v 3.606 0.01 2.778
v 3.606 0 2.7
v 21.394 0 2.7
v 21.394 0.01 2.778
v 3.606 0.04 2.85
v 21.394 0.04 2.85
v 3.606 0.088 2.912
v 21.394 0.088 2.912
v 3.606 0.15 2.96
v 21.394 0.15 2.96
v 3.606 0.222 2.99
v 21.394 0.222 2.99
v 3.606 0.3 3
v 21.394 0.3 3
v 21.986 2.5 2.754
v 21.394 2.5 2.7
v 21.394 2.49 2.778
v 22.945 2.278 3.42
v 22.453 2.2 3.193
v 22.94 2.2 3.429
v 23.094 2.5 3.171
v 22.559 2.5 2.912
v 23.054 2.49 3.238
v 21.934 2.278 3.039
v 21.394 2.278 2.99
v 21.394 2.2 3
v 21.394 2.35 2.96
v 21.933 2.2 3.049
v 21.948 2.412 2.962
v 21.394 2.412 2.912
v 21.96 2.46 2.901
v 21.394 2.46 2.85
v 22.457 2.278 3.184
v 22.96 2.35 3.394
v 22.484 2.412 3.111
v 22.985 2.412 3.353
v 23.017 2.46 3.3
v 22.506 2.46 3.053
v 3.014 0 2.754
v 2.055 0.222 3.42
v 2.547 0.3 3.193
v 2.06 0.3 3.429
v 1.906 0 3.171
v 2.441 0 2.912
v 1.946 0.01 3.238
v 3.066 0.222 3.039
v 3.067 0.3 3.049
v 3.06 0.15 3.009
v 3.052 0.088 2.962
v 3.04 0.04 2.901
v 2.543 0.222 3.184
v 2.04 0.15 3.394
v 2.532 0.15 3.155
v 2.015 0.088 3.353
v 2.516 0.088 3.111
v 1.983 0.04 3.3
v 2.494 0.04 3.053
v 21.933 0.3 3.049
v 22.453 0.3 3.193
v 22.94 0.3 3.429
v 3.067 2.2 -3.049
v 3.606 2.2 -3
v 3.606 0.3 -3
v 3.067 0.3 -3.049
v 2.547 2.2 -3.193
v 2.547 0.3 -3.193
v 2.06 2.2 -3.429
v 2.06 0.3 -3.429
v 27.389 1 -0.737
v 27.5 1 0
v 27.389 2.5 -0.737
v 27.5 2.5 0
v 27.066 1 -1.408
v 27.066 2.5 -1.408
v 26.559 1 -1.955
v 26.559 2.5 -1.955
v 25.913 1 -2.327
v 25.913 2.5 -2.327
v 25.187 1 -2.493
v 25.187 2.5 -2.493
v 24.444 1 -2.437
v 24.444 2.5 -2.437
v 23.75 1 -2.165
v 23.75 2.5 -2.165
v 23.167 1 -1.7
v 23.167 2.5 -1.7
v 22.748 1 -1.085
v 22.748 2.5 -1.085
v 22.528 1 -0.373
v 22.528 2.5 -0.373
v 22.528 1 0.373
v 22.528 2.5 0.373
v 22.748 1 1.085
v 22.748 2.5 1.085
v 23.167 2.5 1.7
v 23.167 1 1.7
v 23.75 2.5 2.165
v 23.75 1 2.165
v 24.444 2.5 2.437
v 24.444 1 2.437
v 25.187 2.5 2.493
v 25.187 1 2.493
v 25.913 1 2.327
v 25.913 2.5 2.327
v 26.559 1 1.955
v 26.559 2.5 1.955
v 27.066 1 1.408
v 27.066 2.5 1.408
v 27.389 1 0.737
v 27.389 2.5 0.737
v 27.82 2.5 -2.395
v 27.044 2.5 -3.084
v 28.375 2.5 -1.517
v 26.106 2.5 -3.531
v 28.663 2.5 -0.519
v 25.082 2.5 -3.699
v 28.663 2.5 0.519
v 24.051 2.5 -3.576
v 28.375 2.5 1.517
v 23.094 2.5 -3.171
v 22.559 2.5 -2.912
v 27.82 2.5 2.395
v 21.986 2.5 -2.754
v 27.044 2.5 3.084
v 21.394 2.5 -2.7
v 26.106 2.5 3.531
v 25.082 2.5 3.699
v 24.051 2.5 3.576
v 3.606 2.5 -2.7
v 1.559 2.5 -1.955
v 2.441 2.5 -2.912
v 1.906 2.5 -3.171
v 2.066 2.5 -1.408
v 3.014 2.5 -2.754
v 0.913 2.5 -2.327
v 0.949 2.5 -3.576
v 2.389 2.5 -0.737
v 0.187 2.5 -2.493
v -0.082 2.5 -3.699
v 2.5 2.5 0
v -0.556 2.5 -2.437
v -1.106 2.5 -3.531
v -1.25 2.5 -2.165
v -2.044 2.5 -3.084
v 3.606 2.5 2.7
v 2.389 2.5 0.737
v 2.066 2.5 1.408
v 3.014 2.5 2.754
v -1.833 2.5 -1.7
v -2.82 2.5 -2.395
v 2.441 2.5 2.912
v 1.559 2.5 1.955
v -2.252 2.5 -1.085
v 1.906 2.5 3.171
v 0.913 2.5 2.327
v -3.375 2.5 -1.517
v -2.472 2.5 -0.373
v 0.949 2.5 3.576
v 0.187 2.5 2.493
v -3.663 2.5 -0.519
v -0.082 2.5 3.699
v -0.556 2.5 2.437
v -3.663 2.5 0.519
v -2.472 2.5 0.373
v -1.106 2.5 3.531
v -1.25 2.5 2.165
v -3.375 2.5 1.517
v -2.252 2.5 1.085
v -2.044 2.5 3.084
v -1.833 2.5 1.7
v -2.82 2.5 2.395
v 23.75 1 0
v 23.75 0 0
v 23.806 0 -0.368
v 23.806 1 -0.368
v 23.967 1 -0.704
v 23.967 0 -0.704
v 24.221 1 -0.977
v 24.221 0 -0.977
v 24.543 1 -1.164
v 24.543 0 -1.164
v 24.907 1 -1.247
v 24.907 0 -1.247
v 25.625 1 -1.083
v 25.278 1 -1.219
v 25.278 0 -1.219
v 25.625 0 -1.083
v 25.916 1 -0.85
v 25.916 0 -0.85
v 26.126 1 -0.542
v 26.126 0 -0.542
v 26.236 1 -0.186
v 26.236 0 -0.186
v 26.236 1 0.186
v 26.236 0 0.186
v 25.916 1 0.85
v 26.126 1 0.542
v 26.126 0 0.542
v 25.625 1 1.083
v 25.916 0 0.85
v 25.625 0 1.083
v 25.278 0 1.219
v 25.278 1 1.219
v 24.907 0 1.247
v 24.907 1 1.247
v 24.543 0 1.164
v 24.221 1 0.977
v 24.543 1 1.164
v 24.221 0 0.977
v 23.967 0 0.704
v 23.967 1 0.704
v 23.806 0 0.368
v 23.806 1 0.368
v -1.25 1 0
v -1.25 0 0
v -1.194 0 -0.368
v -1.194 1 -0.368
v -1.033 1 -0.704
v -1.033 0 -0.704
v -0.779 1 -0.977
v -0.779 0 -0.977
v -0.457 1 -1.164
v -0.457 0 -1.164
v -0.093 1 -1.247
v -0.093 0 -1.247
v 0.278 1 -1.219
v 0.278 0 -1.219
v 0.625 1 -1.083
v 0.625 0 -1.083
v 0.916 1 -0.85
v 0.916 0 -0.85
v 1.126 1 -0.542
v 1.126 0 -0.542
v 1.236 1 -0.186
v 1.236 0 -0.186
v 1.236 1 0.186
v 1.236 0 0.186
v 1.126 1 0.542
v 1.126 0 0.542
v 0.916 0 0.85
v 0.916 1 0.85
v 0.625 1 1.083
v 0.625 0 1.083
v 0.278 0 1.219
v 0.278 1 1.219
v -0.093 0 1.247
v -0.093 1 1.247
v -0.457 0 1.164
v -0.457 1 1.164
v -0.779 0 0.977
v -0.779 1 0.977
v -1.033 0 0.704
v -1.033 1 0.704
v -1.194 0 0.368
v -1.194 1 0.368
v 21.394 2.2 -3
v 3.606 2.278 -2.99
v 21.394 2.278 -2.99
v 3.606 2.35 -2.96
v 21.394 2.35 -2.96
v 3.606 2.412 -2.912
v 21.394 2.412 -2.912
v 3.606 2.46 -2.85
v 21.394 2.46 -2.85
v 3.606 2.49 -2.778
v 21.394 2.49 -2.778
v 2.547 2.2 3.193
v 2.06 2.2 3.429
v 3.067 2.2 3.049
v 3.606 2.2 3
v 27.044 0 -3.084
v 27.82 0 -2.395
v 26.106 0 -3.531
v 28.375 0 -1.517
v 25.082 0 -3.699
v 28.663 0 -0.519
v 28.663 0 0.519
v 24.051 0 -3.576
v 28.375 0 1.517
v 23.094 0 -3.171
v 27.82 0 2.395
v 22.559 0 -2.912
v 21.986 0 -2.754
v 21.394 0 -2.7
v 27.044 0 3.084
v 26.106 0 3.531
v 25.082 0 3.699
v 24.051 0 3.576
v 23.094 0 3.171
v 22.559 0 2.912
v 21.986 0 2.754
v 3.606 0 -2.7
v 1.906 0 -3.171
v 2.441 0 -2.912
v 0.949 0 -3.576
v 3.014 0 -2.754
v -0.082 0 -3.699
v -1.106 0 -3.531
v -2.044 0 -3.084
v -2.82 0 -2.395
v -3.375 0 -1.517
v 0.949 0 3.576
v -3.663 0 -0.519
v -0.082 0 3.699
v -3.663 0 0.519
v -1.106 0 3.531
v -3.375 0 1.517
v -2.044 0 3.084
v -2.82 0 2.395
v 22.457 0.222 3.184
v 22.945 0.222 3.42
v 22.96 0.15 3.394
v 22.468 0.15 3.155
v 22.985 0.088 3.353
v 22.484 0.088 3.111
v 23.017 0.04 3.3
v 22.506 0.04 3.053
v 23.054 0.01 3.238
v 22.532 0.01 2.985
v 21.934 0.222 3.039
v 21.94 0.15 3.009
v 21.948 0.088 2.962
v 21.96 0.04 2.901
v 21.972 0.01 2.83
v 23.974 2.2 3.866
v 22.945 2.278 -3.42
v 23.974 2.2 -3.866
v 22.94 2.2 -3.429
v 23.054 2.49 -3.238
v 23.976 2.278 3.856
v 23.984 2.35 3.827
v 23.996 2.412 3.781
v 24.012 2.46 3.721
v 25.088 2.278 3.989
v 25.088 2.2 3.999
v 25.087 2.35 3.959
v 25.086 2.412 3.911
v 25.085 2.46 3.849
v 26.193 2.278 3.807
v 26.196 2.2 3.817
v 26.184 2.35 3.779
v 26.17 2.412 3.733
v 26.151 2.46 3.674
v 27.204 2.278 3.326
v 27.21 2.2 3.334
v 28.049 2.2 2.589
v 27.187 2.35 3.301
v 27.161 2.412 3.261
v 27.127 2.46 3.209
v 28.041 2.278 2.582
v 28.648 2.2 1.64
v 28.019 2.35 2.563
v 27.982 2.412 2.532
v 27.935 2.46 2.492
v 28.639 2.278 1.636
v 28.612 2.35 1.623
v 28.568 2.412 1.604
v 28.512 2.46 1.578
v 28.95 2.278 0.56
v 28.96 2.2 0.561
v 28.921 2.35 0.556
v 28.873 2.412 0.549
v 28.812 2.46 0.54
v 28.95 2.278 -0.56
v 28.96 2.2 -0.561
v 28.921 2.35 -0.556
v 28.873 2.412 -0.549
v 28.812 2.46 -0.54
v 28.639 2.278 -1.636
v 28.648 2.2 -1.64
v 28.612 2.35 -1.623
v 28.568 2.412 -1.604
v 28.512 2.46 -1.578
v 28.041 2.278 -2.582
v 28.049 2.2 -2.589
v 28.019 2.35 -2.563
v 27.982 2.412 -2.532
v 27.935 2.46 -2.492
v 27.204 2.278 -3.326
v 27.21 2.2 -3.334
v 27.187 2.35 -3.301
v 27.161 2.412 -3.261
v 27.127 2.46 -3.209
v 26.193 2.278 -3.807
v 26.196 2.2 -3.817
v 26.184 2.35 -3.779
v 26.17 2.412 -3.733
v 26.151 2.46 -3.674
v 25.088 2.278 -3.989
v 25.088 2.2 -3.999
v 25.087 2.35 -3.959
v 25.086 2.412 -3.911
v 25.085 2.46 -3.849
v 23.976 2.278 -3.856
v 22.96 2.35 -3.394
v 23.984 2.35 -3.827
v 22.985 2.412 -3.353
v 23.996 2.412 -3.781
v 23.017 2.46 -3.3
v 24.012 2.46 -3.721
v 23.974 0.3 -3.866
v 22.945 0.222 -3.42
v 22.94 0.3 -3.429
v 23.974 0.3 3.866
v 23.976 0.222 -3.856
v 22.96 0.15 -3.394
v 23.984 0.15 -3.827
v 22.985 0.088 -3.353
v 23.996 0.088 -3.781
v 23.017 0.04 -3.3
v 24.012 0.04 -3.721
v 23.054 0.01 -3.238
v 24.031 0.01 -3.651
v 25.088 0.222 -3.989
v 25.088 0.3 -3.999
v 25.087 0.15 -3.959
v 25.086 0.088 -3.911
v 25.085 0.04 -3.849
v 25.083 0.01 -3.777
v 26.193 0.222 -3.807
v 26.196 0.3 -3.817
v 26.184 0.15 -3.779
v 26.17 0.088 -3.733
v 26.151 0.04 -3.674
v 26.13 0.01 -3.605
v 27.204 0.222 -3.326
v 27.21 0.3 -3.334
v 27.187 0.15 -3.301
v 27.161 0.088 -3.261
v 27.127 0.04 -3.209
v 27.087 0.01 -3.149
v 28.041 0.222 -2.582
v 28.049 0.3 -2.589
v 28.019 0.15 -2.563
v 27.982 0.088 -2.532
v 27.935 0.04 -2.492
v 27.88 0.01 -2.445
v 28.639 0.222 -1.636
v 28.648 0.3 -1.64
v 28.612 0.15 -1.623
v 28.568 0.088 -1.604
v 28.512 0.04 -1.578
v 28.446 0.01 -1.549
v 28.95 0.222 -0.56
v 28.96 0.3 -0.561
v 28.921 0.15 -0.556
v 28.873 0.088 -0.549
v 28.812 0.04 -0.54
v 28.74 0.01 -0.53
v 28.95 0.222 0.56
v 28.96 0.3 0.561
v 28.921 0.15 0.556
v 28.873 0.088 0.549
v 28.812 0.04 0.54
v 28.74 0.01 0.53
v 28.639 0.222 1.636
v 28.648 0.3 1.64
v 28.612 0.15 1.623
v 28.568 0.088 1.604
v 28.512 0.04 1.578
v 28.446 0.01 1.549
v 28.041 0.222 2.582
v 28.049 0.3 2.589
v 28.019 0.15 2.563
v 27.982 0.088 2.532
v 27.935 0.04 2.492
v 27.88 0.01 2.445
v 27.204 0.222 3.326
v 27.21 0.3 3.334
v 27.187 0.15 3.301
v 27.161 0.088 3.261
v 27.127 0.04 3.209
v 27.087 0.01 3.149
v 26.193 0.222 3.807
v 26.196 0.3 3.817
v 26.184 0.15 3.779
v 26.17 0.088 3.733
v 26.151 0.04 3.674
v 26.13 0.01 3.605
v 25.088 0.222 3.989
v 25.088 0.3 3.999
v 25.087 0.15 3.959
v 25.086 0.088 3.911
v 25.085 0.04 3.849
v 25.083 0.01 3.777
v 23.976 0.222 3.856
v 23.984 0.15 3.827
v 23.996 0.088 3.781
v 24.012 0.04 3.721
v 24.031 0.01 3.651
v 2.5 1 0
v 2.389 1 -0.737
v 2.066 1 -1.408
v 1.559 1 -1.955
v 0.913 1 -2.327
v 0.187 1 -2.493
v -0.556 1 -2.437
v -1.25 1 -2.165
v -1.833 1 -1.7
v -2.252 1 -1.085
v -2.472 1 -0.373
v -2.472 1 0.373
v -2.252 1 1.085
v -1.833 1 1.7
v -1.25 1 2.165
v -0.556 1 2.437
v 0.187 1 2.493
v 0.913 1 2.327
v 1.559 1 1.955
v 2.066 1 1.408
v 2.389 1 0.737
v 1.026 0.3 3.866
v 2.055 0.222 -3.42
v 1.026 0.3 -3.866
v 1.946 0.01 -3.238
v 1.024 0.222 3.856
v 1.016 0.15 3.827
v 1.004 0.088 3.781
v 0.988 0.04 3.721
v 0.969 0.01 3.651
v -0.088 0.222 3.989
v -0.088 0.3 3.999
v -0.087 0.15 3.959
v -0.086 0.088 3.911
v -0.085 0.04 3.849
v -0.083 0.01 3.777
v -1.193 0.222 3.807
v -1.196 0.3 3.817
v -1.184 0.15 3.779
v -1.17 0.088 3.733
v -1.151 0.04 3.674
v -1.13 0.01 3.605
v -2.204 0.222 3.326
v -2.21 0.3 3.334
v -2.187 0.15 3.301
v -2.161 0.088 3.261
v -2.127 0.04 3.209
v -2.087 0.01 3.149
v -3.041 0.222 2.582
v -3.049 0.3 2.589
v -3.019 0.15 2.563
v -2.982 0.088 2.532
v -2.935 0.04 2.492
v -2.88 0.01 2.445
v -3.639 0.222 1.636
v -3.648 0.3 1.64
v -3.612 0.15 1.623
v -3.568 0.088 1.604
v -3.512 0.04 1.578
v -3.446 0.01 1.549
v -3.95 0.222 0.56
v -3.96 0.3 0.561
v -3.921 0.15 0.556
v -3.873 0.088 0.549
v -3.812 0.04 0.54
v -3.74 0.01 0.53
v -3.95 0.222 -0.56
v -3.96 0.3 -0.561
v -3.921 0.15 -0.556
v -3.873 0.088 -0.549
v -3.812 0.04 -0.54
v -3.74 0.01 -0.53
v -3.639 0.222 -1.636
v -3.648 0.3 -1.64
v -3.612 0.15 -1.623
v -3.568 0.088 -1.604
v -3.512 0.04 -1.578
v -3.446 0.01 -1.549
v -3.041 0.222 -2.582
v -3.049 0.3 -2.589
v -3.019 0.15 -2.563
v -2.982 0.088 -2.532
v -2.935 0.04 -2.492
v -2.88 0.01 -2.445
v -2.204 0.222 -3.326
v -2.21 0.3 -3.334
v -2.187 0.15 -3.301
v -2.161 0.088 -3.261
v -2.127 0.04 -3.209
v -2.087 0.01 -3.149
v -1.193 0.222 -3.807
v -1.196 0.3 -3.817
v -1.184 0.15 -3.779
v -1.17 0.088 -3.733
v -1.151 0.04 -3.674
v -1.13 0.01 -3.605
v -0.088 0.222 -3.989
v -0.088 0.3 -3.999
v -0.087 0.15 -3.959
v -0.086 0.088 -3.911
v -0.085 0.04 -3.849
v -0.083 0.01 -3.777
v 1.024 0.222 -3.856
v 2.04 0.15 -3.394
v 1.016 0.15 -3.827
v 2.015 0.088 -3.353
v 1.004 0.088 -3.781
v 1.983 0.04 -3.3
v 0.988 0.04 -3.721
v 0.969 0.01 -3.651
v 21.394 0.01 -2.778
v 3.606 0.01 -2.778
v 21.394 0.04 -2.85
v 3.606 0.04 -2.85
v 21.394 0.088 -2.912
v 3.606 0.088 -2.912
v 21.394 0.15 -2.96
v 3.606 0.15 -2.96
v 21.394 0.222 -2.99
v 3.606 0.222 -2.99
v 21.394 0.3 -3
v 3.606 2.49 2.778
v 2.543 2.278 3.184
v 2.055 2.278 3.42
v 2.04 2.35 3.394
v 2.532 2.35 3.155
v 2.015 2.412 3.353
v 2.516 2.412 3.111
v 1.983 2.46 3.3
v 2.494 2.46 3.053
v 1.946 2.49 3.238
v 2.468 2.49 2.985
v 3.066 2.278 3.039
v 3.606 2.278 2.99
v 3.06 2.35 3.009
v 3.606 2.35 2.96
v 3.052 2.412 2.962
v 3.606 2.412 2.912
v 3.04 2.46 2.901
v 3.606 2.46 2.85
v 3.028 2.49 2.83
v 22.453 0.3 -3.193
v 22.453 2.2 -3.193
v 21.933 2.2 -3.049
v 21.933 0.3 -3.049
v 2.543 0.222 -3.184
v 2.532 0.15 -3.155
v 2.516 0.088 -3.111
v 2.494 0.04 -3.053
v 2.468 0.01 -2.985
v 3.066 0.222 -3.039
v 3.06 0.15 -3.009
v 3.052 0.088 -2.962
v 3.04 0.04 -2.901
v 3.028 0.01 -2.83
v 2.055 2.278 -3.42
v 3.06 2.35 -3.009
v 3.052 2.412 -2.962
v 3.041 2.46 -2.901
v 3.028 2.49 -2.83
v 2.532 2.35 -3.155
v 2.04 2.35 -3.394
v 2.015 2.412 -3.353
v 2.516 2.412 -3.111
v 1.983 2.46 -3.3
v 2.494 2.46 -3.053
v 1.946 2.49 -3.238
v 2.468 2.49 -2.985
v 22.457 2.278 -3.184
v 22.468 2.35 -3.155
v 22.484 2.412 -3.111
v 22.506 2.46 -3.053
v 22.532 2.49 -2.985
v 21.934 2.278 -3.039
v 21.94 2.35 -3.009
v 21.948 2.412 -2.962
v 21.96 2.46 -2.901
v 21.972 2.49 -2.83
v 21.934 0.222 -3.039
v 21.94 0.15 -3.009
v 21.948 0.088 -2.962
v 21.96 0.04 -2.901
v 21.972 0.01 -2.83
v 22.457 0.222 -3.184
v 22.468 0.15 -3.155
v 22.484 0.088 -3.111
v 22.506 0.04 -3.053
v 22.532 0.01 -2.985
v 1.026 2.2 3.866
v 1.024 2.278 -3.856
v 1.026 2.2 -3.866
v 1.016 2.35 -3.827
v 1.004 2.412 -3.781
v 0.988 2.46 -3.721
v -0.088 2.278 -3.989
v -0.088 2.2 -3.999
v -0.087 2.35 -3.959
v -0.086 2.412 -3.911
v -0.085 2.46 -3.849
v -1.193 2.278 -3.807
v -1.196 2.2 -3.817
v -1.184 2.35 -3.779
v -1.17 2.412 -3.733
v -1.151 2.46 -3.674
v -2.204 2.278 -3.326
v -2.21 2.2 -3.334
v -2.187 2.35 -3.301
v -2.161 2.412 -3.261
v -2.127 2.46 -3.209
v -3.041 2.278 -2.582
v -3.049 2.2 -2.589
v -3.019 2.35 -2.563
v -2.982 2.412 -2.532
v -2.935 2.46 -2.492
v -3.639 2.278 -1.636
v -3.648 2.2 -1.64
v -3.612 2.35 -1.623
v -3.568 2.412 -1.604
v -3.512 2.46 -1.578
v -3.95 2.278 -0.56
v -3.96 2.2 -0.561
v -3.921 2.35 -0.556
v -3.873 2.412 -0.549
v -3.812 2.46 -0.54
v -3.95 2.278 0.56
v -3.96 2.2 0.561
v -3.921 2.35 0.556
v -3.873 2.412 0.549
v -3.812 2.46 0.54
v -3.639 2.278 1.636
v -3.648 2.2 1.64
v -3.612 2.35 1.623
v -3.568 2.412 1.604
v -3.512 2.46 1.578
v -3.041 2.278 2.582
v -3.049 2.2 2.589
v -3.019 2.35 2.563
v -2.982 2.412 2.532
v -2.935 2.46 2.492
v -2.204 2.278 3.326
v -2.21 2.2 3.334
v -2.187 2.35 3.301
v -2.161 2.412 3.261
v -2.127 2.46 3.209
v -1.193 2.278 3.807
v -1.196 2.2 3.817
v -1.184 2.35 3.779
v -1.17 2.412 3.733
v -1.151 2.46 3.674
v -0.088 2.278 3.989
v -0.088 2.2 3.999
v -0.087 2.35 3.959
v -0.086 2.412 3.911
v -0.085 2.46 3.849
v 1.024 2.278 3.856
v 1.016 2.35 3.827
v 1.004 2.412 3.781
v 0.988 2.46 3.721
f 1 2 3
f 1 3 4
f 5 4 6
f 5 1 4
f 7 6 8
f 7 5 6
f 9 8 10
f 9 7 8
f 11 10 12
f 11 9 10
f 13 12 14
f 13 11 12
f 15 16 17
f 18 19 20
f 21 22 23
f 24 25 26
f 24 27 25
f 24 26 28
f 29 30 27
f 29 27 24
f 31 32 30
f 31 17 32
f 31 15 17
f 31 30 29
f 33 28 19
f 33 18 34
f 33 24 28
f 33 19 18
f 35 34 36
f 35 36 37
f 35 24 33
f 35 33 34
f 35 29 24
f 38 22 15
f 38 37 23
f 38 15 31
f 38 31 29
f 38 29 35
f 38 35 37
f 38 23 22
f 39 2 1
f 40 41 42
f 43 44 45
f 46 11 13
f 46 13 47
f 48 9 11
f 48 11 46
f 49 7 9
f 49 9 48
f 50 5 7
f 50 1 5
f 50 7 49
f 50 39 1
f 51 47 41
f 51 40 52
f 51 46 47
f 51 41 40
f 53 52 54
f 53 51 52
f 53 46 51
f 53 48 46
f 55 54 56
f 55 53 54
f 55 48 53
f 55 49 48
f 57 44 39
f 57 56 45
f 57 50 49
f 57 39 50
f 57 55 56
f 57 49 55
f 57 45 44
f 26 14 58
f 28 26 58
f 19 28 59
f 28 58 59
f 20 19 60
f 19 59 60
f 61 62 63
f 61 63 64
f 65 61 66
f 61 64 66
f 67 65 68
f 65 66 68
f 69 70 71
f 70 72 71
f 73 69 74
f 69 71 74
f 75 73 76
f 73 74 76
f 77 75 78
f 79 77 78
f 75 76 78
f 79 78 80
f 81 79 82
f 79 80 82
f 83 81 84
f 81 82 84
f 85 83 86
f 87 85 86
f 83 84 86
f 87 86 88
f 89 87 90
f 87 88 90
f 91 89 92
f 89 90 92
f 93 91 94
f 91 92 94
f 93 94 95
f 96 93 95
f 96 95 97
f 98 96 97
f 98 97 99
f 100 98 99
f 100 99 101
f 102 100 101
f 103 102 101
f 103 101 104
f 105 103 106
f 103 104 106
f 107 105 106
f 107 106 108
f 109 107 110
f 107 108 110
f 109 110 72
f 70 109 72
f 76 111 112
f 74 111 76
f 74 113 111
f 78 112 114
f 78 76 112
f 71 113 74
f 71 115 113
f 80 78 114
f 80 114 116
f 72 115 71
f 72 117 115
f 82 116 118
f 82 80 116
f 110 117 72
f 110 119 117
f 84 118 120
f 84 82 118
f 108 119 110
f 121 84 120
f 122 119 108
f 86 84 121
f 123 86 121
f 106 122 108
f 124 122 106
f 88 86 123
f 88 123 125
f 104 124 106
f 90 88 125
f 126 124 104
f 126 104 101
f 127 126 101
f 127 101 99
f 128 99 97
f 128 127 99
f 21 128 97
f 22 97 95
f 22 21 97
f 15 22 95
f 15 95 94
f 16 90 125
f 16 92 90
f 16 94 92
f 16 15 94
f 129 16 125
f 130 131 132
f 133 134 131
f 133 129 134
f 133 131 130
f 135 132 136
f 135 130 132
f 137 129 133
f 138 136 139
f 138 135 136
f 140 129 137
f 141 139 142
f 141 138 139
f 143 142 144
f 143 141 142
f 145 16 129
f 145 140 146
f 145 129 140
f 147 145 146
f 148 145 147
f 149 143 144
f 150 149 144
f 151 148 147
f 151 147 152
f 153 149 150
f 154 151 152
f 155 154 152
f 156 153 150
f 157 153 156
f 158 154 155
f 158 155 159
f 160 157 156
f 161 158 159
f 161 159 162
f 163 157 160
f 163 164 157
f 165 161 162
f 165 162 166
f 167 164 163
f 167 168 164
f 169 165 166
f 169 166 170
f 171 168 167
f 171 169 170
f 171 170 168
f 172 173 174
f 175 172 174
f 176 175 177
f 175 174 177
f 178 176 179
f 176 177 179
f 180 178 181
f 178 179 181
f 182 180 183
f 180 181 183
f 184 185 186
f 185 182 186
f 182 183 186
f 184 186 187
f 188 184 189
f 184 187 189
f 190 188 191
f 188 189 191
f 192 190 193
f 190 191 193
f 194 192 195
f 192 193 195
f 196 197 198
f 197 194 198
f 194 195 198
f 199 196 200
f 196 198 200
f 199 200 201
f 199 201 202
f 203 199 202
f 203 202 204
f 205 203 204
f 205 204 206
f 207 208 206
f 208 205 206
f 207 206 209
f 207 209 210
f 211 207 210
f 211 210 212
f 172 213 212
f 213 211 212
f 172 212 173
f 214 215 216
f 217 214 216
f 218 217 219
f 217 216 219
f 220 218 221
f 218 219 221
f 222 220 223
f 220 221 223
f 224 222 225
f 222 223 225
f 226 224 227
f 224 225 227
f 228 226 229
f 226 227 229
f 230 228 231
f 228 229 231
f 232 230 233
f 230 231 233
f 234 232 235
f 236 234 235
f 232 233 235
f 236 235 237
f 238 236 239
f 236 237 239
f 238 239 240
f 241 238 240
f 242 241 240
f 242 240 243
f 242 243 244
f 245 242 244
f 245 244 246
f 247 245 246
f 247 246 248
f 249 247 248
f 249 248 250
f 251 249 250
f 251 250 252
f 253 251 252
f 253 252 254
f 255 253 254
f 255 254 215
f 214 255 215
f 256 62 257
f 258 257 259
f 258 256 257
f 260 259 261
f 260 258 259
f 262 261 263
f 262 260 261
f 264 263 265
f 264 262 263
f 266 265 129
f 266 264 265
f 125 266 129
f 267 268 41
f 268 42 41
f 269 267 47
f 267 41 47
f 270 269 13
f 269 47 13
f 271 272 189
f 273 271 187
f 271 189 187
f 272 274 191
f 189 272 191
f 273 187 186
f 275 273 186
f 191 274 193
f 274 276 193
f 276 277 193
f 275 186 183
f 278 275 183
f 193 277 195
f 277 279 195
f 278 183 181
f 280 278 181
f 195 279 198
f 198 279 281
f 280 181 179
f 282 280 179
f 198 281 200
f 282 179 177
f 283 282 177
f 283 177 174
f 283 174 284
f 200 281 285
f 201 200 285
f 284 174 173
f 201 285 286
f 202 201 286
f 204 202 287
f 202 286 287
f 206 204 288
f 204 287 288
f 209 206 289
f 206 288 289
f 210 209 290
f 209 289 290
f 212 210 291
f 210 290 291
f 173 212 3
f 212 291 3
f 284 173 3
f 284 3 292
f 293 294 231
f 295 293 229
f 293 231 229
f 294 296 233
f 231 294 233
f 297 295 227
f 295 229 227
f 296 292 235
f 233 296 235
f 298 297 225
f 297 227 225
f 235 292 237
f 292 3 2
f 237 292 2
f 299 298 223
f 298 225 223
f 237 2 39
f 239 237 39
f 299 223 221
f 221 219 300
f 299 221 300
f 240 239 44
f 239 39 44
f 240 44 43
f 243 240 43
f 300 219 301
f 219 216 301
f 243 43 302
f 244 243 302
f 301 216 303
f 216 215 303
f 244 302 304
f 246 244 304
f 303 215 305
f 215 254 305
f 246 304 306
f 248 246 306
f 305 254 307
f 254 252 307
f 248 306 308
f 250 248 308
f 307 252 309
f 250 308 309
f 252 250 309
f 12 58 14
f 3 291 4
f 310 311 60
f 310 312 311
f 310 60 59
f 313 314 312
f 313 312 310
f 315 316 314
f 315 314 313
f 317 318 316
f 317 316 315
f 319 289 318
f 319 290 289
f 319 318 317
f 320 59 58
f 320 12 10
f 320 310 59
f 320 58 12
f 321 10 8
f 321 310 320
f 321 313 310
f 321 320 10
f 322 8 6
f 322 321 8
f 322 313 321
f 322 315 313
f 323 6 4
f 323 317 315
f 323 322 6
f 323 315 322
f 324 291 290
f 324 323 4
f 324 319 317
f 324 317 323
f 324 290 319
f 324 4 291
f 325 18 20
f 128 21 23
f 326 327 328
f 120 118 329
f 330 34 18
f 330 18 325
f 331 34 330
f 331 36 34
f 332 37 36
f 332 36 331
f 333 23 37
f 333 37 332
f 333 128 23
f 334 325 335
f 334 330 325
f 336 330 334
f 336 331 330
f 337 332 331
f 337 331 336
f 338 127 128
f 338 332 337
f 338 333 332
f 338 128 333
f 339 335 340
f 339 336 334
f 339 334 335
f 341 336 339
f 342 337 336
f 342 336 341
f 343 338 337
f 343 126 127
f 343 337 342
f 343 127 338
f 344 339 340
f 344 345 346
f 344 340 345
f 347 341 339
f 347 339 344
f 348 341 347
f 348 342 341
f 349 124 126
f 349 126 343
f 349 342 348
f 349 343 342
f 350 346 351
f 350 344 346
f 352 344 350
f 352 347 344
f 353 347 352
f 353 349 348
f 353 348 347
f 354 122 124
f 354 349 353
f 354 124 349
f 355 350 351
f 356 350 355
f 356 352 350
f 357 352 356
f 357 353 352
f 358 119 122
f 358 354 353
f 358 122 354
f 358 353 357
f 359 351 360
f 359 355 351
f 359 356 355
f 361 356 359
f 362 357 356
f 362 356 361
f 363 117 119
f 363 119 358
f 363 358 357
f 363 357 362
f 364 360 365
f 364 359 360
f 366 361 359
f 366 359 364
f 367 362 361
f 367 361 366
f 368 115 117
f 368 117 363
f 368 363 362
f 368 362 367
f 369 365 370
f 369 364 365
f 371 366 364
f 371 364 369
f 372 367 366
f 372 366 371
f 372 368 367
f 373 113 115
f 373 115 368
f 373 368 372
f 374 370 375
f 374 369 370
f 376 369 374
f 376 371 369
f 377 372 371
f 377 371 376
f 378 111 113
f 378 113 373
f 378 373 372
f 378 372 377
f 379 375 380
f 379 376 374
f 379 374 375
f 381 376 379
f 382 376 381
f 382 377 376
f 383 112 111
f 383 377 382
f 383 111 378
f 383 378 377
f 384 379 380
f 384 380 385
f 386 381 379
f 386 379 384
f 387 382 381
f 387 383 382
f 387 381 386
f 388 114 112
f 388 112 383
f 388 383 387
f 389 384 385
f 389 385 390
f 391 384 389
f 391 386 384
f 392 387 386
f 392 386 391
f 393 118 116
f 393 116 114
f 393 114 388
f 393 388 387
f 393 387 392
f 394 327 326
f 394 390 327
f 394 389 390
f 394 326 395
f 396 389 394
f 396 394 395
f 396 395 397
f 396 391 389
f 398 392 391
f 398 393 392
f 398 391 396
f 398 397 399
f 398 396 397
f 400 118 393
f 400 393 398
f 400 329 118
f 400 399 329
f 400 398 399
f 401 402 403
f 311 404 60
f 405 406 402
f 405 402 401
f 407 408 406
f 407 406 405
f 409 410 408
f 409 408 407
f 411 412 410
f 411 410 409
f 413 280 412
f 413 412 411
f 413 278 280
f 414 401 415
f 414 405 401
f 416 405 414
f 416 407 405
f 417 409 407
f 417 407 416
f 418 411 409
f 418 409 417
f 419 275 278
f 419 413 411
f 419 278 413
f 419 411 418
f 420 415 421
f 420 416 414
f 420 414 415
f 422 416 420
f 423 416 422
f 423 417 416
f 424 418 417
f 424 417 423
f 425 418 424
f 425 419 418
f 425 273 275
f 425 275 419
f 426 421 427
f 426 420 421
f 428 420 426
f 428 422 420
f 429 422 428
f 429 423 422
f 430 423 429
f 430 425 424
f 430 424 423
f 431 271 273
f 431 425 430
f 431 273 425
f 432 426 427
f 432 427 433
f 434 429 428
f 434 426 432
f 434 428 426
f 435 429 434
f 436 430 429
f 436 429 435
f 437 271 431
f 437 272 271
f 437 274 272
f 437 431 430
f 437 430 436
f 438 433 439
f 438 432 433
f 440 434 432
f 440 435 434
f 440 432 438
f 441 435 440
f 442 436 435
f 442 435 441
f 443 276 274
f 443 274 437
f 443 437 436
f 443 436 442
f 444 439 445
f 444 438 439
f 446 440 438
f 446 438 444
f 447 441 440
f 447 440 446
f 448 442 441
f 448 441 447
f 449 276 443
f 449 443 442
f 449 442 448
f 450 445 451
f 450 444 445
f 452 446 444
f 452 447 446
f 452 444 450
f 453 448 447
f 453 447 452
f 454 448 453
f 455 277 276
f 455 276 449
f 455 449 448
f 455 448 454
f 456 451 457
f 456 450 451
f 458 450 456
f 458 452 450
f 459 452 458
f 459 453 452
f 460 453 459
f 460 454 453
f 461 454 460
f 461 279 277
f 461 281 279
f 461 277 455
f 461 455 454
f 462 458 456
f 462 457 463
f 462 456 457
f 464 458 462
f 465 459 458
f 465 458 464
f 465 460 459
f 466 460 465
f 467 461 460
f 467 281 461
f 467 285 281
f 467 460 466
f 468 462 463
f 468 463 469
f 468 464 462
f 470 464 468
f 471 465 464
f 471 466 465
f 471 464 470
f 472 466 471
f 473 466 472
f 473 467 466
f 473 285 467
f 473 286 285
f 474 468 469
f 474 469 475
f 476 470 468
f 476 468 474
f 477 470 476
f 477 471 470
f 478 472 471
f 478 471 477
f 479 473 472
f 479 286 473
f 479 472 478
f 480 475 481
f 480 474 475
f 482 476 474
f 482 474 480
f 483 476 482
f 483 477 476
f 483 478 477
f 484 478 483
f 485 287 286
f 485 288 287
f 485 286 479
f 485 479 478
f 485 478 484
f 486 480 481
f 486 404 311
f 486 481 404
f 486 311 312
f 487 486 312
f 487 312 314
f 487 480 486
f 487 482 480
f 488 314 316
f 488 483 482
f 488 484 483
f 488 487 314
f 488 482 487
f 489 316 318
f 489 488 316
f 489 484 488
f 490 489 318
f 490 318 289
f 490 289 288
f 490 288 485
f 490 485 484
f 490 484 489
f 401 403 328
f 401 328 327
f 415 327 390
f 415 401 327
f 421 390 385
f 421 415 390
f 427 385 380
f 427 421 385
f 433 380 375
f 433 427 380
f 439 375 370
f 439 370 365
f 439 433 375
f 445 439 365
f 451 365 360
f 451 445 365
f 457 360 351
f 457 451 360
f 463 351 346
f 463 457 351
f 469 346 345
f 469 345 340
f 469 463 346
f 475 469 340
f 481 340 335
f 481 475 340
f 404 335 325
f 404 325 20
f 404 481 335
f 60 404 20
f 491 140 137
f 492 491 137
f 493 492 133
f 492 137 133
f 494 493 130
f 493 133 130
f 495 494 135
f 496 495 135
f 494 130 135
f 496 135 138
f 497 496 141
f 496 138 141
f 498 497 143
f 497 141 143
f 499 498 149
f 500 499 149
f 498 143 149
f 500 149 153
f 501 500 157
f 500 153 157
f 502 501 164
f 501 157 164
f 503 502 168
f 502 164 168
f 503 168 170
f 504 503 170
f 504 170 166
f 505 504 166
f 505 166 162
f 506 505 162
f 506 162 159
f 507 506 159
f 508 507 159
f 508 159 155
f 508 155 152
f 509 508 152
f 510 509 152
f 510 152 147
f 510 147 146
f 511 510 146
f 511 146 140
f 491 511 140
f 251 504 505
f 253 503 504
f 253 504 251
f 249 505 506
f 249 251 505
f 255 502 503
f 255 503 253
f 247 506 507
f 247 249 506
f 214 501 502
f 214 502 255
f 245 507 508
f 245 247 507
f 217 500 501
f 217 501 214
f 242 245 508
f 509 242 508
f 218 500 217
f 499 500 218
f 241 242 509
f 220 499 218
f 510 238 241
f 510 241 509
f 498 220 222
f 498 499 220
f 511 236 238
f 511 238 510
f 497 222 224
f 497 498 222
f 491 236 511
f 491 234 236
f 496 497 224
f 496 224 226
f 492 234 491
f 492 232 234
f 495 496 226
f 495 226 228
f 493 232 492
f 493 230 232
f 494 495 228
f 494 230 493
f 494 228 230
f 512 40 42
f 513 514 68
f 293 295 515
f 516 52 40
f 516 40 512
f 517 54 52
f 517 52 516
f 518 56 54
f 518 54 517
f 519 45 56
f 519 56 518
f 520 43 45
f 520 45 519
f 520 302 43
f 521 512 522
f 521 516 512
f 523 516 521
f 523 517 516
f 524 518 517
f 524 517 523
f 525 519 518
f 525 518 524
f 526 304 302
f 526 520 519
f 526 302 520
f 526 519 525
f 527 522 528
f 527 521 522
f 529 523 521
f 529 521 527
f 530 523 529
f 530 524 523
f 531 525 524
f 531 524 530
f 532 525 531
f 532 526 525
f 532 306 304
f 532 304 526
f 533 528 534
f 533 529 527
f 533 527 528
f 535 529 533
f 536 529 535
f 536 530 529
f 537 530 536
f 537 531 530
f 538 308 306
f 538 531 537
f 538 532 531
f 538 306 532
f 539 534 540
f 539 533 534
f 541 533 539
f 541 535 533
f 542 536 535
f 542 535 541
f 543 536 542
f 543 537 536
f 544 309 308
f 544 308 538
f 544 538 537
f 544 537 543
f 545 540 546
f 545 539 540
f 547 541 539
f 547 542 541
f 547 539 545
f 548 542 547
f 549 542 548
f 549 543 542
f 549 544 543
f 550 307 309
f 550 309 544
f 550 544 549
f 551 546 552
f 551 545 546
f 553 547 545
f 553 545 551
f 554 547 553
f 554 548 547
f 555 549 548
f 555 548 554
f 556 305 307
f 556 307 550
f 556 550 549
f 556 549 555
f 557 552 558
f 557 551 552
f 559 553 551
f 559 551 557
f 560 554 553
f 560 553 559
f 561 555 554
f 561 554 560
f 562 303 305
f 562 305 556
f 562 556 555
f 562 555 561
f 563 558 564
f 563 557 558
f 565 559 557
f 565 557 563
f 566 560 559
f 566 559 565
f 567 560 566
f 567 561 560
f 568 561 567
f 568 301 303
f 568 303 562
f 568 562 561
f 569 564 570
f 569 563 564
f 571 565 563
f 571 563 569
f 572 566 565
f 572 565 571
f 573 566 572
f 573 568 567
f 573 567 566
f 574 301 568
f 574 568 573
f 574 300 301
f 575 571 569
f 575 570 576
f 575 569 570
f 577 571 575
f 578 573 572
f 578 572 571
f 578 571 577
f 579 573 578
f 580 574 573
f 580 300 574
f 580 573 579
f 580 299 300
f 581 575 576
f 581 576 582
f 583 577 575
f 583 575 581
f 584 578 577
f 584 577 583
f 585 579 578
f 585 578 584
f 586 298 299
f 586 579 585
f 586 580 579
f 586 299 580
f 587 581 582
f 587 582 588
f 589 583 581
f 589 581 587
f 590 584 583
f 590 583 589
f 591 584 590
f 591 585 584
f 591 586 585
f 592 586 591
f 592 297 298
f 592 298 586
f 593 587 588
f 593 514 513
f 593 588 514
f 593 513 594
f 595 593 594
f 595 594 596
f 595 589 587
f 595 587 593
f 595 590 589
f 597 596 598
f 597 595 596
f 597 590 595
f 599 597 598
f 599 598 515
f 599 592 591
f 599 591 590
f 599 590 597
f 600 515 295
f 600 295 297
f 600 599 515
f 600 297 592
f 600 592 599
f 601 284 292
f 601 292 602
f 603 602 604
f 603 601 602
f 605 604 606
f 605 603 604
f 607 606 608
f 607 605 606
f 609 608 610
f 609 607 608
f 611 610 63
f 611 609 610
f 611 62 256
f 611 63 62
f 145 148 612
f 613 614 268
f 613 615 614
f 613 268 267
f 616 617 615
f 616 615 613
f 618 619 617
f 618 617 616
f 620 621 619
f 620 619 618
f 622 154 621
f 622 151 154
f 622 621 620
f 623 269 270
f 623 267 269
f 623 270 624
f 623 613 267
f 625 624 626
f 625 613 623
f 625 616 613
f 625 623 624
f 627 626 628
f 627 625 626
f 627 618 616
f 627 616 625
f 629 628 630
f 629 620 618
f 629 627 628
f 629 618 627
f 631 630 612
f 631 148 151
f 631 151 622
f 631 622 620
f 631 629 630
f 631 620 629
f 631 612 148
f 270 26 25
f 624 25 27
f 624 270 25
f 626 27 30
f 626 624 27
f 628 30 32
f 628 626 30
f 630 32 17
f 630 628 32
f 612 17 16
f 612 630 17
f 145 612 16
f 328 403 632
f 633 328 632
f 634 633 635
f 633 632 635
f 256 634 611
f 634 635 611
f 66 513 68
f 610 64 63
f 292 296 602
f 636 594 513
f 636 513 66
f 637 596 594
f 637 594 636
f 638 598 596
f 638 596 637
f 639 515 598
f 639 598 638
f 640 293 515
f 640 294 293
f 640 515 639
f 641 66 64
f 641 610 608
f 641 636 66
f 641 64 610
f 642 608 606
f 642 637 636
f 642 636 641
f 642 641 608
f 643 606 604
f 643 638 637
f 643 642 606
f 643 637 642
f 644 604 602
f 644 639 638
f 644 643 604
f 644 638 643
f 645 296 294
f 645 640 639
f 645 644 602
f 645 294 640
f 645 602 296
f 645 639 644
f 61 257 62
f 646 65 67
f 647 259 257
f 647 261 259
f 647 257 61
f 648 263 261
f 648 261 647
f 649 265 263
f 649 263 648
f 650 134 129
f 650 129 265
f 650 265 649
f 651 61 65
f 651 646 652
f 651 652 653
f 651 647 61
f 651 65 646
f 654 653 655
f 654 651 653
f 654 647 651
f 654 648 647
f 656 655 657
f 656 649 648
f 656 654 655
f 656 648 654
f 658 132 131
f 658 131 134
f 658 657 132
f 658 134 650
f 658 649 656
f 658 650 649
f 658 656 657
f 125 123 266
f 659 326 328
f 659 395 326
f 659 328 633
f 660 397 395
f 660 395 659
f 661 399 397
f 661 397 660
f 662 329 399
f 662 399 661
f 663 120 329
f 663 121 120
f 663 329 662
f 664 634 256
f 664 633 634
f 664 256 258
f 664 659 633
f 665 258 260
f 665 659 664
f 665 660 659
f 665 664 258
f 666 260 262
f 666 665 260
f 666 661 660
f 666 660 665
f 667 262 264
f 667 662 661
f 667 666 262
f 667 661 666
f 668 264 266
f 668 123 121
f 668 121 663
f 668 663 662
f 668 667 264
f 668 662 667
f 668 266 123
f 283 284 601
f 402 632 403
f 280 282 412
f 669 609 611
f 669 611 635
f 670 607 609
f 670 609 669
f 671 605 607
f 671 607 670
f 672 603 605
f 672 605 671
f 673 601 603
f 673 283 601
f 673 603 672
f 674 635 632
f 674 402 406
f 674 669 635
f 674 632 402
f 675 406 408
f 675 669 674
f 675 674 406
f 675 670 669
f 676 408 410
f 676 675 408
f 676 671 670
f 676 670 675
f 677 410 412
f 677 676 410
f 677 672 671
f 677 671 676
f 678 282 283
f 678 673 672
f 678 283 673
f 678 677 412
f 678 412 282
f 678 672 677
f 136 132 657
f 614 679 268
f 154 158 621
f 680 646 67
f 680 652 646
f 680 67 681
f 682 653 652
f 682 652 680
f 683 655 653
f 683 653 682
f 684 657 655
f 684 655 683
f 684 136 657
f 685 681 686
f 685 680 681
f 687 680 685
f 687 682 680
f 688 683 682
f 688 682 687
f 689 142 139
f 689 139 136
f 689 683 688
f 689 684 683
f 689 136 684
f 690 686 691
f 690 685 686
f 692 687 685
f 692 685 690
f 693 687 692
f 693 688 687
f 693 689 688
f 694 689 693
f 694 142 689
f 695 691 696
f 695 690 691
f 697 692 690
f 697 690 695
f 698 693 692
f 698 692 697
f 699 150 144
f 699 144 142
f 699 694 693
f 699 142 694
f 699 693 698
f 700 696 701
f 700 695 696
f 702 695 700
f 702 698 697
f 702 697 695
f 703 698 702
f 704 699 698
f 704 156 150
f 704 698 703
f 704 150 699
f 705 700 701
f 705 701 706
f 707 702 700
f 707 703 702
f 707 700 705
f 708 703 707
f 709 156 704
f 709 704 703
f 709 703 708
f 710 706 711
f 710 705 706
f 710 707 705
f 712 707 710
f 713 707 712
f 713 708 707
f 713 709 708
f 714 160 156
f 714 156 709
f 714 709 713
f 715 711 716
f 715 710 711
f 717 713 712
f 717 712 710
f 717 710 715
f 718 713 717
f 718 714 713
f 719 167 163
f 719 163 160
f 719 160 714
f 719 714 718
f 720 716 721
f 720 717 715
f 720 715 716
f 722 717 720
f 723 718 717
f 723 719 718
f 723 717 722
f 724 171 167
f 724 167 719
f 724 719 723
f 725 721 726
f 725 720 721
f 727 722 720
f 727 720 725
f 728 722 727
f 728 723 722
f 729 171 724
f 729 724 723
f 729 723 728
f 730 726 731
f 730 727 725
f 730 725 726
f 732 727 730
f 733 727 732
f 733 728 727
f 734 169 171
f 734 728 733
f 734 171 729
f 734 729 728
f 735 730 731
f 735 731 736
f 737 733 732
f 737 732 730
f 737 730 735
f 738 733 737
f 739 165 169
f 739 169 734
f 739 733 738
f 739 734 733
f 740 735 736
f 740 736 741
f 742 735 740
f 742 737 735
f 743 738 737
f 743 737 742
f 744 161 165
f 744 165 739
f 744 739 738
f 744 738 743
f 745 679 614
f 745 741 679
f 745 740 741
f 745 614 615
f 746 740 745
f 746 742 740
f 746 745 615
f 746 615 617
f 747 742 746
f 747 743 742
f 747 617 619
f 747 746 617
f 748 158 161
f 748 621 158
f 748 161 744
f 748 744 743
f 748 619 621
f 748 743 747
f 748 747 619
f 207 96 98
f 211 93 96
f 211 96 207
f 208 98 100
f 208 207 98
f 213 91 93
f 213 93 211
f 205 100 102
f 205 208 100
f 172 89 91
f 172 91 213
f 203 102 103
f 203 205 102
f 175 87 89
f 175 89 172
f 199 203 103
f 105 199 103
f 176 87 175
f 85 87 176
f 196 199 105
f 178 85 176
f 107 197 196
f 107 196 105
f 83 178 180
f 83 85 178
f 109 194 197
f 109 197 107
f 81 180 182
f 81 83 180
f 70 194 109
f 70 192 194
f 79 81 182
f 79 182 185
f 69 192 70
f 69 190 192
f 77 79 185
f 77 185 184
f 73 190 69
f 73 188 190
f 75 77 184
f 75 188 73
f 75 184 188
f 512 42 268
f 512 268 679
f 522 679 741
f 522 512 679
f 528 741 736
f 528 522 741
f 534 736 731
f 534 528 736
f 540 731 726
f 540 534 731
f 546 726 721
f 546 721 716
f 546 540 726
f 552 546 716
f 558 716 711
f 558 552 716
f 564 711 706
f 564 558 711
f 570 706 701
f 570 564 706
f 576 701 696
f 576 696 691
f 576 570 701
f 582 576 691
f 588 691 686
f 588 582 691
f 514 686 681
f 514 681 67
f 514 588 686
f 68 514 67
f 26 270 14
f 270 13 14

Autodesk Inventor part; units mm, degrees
ref_plane "YZ Plane" through (0, 0, 0) normal (1, 0, 0) x (0, 1, 0)
ref_plane "XZ Plane" through (0, 0, 0) normal (0, 1, 0) x (-1, 0, 0)
ref_plane "XY Plane" through (0, 0, 0) normal (0, 0, 1) x (1, 0, 0)
sketch "Esboço1" plane through (0, 0, 0) normal (0, 1, 0) x (-1, 0, 0)
  circle A0 centre (0, 0) radius 1.25
  arc A1 (-2.0603, -3.4286) -> (-2.0603, 3.4286) centre (0, 0) ccw
  circle A2 centre (-25, 0) radius 1.25
  arc A3 (-22.9397, 3.4286) -> (-22.9397, -3.4286) centre (-25, 0) ccw
  line L0 (-3.6056, -3) -> (-21.3944, -3)
  line L1 (-3.6056, 3) -> (-21.3944, 3)
  arc A4 (-2.0603, -3.4286) -> (-3.6056, -3) centre (-3.6056, -6) ccw
  arc A5 (-3.6056, 3) -> (-2.0603, 3.4286) centre (-3.6056, 6) ccw
  arc A6 (-21.3944, -3) -> (-22.9397, -3.4286) centre (-21.3944, -6) ccw
  arc A7 (-22.9397, 3.4286) -> (-21.3944, 3) centre (-21.3944, 6) ccw
  point P0 (-2.6458, -3)
  point P1 (-22.3542, -3)
  point P2 (-2.6458, 3)
  point P3 (-22.3542, 3)
  dimension "d1" = 2.5
  dimension "d3" = 6
  dimension "d5" = 3
  dimension "d6" = 25
  dimension "d10" = 4
extrude "Extrusão1" add sketch "Esboço1" along normal blind 2.5
fillet "Arredondamento1" radius 0.3 16 edges at (22.1962, 0, 3.1091) (29, 0, 0) (22.1962, 0, -3.1091) (12.5, 0, -3) (2.8038, 0, -3.1091) (-4, 0, 0) (2.8038, 0, 3.1091) (12.5, 0, 3) (22.1962, 2.5, 3.1091) (29, 2.5, 0) (22.1962, 2.5, -3.1091) (12.5, 2.5, -3) (2.8038, 2.5, -3.1091) (-4, 2.5, 0) (2.8038, 2.5, 3.1091) (12.5, 2.5, 3)
sketch "Esboço2" plane through (0, 2.5, 0) normal (0, 1, 0) x (1, 0, 0)
  circle A0 centre (0, 0) radius 2.5
  circle A1 centre (25, 0) radius 1.25 projected
  circle A2 centre (25, 0) radius 2.5
  dimension "d11" = 5
extrude "Extrusão2" cut sketch "Esboço2" against normal blind 1.5
properties part number "_3DPrint"
